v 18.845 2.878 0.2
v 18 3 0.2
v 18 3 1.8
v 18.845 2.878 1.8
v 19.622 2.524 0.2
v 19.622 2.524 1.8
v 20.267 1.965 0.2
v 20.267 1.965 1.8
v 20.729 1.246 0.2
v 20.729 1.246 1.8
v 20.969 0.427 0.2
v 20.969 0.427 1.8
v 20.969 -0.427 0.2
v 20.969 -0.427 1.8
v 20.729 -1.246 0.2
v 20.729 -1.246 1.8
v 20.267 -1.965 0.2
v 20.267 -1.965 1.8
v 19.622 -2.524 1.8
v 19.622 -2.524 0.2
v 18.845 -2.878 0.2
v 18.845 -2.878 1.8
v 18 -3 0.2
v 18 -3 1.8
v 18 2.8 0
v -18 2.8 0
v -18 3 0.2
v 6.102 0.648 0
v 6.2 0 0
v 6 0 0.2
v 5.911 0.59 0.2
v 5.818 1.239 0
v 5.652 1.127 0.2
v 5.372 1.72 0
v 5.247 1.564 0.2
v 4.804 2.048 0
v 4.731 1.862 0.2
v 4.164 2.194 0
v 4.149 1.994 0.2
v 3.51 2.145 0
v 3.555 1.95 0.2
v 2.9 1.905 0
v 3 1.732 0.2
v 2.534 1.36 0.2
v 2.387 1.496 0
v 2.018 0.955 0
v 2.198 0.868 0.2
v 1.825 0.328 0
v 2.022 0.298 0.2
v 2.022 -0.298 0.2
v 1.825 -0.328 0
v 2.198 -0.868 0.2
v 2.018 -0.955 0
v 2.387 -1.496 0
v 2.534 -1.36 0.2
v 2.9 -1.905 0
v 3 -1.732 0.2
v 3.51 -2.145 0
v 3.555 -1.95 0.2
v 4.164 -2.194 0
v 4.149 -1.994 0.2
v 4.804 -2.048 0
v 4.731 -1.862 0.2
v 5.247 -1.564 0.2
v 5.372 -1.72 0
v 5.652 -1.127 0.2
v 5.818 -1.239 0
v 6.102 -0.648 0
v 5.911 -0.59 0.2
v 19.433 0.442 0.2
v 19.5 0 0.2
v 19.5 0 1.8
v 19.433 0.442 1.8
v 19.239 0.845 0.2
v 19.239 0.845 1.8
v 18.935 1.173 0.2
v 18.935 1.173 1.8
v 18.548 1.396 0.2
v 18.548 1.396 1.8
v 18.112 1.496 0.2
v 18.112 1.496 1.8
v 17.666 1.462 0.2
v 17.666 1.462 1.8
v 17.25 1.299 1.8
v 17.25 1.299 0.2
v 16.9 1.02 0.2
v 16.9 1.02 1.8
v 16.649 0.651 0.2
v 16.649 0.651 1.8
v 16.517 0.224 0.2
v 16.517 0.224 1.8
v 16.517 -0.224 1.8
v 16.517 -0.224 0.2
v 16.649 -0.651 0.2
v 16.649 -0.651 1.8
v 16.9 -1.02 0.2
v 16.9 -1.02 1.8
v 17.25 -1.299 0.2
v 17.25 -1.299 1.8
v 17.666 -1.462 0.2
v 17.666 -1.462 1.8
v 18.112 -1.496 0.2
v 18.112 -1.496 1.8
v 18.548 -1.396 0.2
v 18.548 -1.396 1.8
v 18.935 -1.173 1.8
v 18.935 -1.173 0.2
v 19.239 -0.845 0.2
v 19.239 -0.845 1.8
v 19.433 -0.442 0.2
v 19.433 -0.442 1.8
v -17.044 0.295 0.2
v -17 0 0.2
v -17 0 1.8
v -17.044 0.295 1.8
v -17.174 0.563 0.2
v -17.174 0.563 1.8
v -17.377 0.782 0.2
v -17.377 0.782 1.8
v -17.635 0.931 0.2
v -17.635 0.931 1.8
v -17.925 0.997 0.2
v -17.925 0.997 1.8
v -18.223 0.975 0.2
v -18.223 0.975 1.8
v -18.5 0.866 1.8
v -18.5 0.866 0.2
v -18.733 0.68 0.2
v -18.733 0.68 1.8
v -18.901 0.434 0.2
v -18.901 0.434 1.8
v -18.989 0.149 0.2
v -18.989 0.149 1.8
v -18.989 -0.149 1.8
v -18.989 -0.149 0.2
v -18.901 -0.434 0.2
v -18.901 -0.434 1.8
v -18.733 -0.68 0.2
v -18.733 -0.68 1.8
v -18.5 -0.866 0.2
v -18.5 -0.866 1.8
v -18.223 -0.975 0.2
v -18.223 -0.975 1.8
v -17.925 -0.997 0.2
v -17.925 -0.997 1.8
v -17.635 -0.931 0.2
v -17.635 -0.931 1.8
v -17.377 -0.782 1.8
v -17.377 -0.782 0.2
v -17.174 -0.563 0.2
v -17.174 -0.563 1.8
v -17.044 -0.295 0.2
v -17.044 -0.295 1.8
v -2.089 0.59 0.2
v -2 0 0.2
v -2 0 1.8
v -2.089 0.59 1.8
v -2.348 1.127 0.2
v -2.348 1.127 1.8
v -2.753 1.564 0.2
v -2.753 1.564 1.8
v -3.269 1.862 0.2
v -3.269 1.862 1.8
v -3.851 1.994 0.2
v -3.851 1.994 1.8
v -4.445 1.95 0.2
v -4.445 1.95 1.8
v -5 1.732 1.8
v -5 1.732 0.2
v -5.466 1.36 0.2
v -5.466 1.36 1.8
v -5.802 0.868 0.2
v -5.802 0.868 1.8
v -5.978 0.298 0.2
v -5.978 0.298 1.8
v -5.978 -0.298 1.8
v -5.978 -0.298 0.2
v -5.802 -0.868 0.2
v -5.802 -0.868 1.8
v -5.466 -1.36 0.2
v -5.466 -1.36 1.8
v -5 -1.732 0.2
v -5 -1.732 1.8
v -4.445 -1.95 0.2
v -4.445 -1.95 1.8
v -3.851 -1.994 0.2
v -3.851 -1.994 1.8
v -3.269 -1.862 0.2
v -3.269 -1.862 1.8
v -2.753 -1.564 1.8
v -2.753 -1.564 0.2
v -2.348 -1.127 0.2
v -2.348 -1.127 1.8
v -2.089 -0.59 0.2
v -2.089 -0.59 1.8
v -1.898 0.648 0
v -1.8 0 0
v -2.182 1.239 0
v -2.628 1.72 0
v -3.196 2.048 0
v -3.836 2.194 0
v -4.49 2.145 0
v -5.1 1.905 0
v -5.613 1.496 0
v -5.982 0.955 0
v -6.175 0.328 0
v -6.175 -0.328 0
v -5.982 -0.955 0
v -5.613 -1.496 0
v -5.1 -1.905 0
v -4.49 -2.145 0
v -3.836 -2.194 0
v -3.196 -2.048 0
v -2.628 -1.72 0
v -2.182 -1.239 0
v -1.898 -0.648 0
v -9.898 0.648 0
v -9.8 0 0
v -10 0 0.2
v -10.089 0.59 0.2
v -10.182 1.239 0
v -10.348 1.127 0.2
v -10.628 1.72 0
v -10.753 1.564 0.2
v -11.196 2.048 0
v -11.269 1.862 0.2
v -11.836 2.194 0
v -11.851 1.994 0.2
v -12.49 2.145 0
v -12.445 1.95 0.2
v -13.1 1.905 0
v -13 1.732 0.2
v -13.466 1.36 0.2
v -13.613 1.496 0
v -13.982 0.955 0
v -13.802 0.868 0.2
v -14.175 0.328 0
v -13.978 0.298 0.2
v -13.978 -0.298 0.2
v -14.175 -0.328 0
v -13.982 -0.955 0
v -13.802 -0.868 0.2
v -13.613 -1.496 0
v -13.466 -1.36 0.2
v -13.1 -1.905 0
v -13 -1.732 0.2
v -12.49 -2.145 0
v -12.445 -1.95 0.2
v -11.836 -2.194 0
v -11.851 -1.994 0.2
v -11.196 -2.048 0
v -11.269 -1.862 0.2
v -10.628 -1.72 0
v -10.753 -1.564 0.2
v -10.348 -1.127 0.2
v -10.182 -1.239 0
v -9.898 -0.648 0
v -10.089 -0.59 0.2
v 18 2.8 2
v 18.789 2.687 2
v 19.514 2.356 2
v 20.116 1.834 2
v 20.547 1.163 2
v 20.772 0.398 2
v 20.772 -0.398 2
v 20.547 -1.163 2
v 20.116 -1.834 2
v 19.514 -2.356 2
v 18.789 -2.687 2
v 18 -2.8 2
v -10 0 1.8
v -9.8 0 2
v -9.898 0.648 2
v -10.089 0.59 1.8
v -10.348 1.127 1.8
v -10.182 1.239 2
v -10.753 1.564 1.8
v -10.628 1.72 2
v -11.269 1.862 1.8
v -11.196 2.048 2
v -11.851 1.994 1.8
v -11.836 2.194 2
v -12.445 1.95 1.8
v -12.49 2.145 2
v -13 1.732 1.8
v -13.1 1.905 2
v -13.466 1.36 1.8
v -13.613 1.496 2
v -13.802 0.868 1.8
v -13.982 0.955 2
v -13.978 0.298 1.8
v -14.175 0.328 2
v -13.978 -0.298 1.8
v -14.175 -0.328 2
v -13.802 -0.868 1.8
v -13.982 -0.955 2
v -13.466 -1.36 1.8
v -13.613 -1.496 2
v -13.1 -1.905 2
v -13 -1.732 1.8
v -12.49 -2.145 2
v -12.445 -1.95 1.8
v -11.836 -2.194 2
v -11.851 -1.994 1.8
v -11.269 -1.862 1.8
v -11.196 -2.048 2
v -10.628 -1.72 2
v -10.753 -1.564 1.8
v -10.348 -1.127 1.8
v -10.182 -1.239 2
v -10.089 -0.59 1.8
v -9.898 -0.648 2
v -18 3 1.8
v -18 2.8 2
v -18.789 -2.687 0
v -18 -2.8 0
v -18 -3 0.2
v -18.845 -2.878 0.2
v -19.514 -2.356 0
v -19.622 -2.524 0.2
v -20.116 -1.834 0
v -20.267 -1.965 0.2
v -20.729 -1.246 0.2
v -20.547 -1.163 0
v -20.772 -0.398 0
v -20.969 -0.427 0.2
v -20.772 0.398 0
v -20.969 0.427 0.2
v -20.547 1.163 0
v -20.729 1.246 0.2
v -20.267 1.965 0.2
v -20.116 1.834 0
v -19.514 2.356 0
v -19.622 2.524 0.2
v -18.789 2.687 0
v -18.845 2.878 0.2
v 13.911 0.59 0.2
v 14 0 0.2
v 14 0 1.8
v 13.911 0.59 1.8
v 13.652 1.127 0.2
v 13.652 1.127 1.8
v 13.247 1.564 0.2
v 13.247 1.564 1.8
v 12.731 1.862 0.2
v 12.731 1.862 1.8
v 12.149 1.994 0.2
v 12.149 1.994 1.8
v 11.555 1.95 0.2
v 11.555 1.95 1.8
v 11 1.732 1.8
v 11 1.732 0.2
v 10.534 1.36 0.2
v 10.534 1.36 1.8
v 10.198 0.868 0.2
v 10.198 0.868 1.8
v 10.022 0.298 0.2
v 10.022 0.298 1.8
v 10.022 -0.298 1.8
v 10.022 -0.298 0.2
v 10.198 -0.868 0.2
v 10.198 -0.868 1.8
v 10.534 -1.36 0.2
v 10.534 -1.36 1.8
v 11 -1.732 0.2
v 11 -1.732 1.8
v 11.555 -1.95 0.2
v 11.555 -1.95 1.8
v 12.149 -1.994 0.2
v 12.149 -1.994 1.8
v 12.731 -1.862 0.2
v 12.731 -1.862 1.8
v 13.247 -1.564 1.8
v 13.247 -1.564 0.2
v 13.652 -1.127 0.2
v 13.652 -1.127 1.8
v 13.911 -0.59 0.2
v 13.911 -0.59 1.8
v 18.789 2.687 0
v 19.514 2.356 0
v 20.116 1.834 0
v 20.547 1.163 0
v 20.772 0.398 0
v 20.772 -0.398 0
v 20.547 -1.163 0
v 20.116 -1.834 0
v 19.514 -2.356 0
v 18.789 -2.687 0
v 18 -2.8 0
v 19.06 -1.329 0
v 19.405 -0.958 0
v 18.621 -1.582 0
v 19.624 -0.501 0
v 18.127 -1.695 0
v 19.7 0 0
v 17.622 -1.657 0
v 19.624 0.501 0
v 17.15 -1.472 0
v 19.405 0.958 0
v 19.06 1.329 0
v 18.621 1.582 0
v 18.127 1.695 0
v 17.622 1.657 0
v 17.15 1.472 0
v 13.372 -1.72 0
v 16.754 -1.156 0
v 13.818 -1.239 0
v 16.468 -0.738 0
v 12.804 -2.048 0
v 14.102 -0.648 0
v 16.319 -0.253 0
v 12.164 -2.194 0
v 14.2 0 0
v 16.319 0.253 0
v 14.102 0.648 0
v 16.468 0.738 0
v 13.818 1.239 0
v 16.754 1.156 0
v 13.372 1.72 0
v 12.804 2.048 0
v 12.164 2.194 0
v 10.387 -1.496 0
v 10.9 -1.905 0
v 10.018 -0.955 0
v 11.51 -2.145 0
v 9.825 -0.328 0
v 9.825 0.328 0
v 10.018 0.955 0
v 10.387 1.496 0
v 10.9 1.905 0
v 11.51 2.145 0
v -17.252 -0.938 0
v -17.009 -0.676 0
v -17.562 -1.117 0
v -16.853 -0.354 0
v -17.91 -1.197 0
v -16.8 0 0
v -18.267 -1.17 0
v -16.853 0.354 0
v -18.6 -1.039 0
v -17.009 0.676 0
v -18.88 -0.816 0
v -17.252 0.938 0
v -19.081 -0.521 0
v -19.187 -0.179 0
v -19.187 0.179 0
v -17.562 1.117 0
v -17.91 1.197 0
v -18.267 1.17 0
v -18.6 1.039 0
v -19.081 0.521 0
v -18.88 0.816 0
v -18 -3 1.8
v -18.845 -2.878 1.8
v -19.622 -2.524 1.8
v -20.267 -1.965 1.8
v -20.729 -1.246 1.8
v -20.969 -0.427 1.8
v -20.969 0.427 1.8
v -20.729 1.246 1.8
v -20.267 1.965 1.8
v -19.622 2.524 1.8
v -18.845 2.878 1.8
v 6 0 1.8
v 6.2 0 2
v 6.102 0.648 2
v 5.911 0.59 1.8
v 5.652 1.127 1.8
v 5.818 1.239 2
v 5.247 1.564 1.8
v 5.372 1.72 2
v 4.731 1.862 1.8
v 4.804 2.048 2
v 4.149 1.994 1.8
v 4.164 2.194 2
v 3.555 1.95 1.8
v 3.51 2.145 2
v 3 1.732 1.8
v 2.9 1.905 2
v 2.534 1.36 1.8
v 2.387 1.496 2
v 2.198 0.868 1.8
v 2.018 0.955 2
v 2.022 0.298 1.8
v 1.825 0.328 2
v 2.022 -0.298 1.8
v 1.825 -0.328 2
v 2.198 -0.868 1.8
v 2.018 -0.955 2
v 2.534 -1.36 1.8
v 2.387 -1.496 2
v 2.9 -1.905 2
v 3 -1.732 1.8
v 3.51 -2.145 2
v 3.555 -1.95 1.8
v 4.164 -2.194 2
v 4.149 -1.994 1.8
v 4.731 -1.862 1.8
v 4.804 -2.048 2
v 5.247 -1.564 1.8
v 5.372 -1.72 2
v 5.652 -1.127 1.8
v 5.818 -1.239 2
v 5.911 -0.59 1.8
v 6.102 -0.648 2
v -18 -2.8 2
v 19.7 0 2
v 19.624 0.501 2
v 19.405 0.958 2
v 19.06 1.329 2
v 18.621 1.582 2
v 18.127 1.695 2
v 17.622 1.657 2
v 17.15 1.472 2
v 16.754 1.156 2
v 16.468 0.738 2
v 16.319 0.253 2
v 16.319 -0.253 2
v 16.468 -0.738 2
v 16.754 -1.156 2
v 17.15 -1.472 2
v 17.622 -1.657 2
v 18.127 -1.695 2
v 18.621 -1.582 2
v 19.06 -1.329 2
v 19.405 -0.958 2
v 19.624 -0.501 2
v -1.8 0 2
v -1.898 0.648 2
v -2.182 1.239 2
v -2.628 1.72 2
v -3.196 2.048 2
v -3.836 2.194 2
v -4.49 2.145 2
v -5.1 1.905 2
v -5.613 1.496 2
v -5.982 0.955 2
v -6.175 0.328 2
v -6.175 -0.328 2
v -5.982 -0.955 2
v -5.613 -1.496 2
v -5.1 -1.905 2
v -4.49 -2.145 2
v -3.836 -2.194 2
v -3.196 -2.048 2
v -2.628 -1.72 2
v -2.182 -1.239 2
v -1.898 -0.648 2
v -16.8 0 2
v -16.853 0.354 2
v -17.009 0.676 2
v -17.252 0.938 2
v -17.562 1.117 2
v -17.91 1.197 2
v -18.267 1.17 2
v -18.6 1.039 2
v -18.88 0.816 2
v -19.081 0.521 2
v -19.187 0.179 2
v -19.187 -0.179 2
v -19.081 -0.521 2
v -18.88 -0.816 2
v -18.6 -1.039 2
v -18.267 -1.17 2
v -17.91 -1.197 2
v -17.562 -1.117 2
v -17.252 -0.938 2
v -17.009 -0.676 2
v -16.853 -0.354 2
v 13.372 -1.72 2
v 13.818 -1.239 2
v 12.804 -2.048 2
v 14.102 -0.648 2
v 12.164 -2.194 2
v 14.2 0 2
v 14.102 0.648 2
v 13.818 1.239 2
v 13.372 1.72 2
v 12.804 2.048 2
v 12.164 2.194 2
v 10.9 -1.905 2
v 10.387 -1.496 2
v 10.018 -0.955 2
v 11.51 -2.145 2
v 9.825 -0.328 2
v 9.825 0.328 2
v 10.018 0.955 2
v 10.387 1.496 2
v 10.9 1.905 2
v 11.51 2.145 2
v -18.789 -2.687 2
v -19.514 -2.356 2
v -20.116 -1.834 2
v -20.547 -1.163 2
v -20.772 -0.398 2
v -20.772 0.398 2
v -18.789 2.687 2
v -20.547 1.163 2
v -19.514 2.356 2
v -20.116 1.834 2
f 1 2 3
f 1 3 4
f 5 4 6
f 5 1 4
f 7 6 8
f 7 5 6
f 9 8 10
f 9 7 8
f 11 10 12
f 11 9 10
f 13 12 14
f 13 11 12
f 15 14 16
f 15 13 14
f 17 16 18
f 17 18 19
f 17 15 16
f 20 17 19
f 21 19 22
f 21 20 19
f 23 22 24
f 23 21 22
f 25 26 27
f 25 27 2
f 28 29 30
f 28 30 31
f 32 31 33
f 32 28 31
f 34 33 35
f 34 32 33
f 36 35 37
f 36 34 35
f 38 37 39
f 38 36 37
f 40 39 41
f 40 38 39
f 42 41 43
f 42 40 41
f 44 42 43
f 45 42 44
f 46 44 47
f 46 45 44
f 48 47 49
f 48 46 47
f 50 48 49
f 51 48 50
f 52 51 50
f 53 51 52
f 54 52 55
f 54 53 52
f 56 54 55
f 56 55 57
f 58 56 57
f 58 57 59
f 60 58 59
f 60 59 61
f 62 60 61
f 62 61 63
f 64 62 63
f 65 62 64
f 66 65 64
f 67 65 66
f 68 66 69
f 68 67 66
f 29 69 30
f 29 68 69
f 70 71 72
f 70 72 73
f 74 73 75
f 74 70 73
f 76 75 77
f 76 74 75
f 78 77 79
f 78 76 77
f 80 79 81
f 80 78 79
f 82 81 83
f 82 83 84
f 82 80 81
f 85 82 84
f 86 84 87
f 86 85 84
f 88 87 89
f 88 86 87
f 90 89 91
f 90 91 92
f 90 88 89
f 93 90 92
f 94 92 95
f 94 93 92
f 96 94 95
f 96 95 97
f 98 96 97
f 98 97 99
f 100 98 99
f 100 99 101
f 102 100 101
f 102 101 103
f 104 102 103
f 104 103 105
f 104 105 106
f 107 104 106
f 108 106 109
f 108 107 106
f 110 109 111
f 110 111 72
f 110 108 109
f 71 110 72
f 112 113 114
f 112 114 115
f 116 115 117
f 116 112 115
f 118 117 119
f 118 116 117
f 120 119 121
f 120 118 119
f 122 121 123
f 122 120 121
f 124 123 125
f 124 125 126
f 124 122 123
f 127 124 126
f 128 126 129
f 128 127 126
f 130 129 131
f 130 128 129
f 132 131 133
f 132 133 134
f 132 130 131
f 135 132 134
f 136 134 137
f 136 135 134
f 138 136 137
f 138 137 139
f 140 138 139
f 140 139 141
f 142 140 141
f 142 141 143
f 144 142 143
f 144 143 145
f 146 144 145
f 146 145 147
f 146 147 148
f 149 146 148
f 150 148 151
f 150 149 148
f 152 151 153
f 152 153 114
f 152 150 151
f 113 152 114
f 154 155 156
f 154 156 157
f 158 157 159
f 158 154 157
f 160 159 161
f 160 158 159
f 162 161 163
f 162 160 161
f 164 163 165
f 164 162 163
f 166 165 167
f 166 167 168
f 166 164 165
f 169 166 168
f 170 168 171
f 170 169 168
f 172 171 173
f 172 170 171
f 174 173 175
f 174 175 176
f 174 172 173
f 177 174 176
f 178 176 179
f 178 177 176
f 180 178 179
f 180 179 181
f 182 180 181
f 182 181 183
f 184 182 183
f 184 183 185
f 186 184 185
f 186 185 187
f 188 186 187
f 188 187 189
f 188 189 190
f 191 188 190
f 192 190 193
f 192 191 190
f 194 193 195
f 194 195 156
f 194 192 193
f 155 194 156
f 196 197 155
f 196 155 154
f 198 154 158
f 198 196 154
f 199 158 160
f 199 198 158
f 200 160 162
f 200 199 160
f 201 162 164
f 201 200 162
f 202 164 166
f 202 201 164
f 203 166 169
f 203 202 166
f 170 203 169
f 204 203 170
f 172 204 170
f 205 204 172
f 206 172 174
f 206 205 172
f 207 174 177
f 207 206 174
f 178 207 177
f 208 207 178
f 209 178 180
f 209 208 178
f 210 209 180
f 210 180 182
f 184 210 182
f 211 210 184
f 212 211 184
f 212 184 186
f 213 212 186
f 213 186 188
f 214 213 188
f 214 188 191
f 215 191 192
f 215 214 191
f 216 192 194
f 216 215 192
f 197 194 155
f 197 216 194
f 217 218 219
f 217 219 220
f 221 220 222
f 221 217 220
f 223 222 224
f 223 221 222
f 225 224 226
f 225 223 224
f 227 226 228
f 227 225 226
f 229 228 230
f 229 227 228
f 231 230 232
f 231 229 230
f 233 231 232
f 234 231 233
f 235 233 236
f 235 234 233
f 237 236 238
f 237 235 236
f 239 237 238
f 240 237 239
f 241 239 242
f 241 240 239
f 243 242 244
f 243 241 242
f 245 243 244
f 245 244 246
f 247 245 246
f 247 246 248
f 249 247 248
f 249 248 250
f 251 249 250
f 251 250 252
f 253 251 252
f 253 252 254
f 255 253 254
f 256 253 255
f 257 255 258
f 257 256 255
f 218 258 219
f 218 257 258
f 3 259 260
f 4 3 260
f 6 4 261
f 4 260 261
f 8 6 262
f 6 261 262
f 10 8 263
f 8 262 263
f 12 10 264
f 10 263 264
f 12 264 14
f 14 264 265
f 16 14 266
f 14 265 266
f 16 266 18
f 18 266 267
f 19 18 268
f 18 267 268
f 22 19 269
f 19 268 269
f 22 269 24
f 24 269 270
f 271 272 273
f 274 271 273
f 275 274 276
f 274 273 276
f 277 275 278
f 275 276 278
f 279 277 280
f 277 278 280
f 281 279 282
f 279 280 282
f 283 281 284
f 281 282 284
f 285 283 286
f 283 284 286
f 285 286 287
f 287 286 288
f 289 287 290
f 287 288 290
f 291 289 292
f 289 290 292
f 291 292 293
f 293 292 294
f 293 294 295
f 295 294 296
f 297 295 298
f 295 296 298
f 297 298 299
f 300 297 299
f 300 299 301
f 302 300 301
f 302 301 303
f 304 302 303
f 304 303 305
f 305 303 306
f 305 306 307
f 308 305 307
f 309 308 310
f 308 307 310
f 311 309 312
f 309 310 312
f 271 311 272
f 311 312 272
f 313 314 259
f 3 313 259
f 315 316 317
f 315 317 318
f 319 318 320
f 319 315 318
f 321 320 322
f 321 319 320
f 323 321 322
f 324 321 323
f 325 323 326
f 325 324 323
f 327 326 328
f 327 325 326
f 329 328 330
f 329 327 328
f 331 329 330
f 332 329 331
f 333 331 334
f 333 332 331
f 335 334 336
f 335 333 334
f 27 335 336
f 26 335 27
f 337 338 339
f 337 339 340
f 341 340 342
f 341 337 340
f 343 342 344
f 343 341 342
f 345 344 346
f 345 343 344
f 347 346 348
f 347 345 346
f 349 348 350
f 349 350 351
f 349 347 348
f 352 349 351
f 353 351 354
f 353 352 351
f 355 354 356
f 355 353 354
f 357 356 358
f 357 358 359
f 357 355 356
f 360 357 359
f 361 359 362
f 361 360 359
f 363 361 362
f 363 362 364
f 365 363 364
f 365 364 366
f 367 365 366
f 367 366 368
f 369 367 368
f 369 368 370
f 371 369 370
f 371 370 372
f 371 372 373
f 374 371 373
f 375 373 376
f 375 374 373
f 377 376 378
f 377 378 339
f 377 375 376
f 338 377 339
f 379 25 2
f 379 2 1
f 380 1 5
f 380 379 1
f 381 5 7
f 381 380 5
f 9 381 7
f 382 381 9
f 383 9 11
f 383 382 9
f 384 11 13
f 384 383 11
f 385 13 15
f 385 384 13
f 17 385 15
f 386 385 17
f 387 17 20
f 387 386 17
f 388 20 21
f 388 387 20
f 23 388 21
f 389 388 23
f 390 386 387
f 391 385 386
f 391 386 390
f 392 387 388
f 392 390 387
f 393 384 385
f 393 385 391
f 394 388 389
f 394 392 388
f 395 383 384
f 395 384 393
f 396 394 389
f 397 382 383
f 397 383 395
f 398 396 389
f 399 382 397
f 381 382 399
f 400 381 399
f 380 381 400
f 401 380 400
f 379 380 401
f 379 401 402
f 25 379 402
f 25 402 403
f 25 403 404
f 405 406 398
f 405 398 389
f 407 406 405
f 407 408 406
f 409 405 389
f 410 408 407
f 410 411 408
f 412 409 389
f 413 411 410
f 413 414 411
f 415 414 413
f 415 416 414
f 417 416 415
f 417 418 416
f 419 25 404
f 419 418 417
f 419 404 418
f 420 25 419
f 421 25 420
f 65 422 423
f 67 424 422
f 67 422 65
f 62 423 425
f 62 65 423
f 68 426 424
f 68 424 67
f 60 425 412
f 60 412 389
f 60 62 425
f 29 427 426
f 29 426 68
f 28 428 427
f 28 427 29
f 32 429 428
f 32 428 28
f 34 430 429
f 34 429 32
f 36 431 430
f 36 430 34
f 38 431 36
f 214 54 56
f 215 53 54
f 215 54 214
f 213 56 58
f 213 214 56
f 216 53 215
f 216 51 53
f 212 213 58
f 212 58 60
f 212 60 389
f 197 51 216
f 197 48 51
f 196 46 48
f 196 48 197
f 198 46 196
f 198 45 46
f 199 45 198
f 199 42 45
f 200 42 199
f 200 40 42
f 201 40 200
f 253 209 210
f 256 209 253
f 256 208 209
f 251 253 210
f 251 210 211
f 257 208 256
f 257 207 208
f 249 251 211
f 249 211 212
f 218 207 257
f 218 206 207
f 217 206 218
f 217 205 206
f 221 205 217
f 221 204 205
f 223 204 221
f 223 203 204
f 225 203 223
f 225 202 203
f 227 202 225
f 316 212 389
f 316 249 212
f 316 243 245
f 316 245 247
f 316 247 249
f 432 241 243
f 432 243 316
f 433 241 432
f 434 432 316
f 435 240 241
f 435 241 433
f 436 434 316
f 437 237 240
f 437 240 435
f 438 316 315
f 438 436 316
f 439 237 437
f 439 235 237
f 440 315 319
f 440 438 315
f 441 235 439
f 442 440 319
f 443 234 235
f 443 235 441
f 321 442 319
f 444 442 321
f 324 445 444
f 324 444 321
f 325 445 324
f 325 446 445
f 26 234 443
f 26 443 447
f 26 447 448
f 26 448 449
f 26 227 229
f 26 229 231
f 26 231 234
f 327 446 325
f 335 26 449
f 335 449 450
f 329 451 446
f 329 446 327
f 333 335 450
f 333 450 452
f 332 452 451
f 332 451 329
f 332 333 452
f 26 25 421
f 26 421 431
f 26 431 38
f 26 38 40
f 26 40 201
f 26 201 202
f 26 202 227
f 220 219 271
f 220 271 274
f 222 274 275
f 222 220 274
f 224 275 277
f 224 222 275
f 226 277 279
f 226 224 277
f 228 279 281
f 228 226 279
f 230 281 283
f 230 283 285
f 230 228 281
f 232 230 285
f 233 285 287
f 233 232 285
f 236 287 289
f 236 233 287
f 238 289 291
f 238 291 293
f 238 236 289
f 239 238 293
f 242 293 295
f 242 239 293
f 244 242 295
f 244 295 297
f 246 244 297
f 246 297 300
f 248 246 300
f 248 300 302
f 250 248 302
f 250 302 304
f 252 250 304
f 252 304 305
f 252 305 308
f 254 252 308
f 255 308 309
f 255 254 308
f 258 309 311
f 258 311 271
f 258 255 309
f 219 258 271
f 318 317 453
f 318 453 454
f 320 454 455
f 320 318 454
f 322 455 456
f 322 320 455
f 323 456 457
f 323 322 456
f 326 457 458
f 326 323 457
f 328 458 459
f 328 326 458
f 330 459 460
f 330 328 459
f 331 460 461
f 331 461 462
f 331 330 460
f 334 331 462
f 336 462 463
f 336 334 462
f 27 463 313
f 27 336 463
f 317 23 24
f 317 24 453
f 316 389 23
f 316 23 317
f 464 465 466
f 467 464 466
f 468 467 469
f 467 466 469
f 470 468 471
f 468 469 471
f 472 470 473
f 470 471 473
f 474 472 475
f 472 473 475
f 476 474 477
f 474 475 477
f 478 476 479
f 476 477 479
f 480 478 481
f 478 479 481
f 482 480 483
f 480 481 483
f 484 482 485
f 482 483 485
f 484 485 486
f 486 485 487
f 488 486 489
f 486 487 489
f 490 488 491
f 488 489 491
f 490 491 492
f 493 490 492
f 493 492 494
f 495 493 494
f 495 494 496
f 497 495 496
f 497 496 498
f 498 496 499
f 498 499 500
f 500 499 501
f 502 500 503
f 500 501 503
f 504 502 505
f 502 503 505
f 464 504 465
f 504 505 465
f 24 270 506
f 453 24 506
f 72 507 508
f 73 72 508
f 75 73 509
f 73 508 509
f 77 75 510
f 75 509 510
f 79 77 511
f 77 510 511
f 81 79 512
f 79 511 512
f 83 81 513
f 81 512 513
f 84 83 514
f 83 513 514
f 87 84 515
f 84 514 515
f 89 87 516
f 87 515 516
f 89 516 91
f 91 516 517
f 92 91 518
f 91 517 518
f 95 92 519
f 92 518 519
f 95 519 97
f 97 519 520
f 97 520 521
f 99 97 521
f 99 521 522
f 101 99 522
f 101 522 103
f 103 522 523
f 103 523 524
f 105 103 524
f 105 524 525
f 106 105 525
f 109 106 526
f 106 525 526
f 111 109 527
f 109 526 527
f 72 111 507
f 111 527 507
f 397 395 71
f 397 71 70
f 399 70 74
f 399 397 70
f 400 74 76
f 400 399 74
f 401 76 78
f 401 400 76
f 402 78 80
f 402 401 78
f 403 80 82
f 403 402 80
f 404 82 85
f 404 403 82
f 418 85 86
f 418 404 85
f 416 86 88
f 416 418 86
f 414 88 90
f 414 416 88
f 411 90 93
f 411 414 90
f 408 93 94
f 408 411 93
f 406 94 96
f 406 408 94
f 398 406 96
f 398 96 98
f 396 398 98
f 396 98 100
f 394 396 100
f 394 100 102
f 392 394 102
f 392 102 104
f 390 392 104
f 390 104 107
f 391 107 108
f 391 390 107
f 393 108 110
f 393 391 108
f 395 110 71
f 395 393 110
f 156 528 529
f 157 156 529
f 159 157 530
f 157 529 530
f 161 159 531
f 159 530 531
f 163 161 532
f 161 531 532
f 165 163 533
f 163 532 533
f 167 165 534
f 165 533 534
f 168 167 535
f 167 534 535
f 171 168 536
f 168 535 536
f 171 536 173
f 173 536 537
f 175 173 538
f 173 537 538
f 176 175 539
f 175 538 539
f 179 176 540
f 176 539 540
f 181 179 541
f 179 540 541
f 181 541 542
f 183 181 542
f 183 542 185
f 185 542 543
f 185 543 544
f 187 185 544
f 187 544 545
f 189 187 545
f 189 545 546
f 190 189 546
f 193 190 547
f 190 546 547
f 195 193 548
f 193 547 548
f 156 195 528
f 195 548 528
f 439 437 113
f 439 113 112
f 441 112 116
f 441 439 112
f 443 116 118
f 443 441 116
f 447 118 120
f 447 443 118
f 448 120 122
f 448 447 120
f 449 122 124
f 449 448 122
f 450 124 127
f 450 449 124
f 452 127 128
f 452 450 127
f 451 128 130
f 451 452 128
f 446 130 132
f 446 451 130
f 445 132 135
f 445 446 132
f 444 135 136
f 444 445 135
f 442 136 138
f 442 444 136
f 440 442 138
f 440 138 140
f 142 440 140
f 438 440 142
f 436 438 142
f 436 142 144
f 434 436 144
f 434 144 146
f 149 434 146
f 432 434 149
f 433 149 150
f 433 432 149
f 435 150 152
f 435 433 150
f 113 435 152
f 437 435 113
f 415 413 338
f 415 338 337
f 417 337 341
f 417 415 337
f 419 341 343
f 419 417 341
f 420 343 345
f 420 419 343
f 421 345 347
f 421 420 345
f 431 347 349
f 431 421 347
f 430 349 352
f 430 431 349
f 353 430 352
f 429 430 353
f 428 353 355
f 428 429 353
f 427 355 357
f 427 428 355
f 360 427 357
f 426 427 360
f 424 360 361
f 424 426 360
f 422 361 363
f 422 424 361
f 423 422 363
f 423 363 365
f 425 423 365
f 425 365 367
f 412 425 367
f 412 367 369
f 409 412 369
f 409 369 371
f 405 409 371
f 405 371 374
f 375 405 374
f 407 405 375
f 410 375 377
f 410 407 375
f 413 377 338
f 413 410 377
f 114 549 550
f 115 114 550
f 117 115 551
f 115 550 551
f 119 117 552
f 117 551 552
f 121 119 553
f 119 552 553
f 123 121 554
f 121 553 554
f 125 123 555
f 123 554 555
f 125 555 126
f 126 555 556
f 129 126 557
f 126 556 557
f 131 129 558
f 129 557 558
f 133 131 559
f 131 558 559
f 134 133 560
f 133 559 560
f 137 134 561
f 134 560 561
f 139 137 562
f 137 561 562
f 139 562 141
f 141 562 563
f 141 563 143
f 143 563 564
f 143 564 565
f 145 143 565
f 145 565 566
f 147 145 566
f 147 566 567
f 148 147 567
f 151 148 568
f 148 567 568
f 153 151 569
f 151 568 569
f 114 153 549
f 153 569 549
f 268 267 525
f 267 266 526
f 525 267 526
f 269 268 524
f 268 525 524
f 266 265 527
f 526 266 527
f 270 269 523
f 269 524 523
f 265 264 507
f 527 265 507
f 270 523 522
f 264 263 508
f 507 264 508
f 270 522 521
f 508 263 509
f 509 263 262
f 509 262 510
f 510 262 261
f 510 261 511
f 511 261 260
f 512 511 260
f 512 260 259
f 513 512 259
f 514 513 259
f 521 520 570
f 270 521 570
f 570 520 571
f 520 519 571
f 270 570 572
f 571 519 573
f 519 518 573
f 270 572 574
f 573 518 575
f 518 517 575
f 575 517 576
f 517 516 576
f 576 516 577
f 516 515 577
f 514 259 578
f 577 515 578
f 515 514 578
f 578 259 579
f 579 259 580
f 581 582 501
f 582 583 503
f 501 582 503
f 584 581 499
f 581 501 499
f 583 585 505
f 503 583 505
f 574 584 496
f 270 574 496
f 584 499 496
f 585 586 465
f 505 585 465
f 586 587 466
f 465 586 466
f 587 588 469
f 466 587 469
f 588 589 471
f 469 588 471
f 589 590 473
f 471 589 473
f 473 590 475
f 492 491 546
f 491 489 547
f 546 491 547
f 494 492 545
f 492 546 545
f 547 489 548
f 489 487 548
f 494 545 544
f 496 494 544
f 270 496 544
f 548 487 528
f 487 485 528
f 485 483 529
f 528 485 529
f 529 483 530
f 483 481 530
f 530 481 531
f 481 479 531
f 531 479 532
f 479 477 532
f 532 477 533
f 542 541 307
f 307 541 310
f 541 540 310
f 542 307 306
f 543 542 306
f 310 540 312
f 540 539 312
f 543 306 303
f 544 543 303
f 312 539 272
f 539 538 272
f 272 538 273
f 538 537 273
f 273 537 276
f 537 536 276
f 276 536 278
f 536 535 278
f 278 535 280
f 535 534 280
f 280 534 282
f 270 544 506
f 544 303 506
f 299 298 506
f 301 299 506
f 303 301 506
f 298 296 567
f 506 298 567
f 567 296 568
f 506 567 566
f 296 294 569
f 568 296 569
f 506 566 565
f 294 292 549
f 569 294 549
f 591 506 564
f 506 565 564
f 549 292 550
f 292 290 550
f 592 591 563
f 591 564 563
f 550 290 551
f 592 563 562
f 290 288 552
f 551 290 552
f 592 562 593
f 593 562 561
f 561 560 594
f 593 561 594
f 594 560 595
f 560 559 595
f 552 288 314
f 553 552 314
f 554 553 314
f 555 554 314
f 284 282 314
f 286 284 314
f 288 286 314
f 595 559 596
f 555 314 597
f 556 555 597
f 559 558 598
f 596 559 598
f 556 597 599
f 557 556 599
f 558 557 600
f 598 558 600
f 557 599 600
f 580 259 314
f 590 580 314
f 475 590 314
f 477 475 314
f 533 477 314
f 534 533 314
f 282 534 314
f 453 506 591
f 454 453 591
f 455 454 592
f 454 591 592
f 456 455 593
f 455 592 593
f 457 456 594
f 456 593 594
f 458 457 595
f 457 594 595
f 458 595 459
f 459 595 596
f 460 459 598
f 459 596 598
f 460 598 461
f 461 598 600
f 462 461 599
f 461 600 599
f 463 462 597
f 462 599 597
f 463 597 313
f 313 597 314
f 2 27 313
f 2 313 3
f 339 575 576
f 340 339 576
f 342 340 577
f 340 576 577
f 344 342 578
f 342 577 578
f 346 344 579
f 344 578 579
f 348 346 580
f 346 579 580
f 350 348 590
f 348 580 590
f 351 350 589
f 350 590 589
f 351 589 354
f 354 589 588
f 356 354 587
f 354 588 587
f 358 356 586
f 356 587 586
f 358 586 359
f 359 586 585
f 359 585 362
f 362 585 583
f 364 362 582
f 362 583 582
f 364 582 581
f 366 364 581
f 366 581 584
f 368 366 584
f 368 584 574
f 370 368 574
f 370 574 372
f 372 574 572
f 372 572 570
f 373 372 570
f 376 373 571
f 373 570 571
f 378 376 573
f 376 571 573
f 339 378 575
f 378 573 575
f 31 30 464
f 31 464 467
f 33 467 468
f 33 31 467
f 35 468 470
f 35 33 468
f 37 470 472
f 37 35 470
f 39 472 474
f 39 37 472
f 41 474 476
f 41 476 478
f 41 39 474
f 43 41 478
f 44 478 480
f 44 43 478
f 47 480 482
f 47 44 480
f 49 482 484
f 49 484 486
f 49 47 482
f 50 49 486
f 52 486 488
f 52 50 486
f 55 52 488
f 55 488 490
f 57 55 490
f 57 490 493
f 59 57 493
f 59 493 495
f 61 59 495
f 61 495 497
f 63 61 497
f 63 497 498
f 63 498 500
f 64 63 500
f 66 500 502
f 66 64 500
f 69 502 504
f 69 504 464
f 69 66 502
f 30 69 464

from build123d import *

# Parameters (mm, degrees)
SKETCH1_R           = 1
SKETCH1_R_2         = 2
SKETCH1_R_3         = 1.5
BOSS_EXTRUDE1_DEPTH = 2
CHAMFER1_SIZE       = 0.2


with BuildPart() as part:
    # Sketch1 → Boss-Extrude1 (new body)
    with BuildSketch(Plane.XY):
        with BuildLine():
            Line((-18, 3), (18, 3))
            ThreePointArc((18, 3), (21, 0), (18, -3))
            Line((18, -3), (-18, -3))
            ThreePointArc((-18, -3), (-21, 0), (-18, 3))
        make_face()
        with Locations((-18, 0)):
            Circle(SKETCH1_R, mode=Mode.SUBTRACT)
        with Locations((-12, 0)):
            Circle(SKETCH1_R_2, mode=Mode.SUBTRACT)
        with Locations((-4, 0)):
            Circle(SKETCH1_R_2, mode=Mode.SUBTRACT)
        with Locations((18, 0)):
            Circle(SKETCH1_R_3, mode=Mode.SUBTRACT)
        with Locations((12, 0)):
            Circle(SKETCH1_R_2, mode=Mode.SUBTRACT)
        with Locations((4, 0)):
            Circle(SKETCH1_R_2, mode=Mode.SUBTRACT)
    extrude(amount=BOSS_EXTRUDE1_DEPTH)

    # Chamfer1
    chamfer1_edges = [part.edges().sort_by_distance(p)[0] for p in [
        (-19, 0, 0),
        (-19, 0, 2),
        (21, 0, 2),
        (-14, 0, 0),
        (-14, 0, 2),
        (0, 3, 2),
        (-6, 0, 0),
        (-6, 0, 2),
        (16.5, 0, 0),
        (16.5, 0, 2),
        (10, 0, 0),
        (10, 0, 2),
        (2, 0, 0),
        (2, 0, 2),
        (-21, 0, 2),
        (0, 3, 0),
        (21, 0, 0),
        (0, -3, 0),
        (-21, 0, 0),
        (0, -3, 2),
    ]]
    chamfer(chamfer1_edges, length=CHAMFER1_SIZE)


solid = part.part
